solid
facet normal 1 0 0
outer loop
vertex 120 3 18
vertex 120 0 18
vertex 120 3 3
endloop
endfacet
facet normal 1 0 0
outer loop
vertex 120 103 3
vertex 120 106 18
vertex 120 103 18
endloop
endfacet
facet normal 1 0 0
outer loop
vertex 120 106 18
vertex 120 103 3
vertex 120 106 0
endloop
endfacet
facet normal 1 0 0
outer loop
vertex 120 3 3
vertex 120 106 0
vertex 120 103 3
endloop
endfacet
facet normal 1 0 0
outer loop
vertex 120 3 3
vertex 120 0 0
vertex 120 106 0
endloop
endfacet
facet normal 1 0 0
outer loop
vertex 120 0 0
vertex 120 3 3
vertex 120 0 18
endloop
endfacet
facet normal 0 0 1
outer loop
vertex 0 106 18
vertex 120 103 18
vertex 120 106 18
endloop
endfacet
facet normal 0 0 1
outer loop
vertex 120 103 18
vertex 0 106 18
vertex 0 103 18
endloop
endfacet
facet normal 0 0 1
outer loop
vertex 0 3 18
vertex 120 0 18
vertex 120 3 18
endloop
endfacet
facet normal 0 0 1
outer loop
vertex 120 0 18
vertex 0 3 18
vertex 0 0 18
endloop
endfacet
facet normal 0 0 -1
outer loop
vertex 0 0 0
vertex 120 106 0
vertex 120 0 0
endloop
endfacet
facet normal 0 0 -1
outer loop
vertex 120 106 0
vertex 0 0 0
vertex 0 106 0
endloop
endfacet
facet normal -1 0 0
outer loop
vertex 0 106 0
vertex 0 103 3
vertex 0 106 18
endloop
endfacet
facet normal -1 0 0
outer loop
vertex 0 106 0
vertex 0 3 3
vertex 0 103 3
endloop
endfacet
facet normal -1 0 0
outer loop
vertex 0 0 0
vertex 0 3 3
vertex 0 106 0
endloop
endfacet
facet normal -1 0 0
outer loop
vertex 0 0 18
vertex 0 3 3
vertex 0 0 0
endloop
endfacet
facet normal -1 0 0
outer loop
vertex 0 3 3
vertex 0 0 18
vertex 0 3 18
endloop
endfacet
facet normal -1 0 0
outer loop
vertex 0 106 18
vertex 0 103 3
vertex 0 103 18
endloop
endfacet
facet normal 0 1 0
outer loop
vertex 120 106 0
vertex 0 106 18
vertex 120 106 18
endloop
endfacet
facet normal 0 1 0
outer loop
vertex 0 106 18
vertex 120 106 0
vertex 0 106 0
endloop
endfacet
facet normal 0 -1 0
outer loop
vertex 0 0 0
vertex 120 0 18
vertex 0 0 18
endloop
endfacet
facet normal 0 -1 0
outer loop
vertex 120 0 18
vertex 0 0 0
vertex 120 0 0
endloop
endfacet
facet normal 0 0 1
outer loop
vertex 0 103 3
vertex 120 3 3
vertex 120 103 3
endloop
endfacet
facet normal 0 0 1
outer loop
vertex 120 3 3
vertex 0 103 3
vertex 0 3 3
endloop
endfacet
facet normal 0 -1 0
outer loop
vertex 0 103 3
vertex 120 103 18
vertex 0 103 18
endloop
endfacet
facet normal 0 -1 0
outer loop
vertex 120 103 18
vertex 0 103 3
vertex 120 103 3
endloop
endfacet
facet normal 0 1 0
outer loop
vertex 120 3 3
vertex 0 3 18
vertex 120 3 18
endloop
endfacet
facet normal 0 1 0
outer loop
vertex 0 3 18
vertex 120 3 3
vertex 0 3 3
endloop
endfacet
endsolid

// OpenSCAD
// U-shaped cover. mm. width is INNER width; height is INNER wall height.
width=100;
length=120;
height=15;
base=3;
wall=3;
assert(min(width,length,height,base,wall)>=0.2);
difference() {
    cube([length,width+2*wall,height+base]);
    translate([-1,wall,base]) cube([length+2,width,height+1]);
}
